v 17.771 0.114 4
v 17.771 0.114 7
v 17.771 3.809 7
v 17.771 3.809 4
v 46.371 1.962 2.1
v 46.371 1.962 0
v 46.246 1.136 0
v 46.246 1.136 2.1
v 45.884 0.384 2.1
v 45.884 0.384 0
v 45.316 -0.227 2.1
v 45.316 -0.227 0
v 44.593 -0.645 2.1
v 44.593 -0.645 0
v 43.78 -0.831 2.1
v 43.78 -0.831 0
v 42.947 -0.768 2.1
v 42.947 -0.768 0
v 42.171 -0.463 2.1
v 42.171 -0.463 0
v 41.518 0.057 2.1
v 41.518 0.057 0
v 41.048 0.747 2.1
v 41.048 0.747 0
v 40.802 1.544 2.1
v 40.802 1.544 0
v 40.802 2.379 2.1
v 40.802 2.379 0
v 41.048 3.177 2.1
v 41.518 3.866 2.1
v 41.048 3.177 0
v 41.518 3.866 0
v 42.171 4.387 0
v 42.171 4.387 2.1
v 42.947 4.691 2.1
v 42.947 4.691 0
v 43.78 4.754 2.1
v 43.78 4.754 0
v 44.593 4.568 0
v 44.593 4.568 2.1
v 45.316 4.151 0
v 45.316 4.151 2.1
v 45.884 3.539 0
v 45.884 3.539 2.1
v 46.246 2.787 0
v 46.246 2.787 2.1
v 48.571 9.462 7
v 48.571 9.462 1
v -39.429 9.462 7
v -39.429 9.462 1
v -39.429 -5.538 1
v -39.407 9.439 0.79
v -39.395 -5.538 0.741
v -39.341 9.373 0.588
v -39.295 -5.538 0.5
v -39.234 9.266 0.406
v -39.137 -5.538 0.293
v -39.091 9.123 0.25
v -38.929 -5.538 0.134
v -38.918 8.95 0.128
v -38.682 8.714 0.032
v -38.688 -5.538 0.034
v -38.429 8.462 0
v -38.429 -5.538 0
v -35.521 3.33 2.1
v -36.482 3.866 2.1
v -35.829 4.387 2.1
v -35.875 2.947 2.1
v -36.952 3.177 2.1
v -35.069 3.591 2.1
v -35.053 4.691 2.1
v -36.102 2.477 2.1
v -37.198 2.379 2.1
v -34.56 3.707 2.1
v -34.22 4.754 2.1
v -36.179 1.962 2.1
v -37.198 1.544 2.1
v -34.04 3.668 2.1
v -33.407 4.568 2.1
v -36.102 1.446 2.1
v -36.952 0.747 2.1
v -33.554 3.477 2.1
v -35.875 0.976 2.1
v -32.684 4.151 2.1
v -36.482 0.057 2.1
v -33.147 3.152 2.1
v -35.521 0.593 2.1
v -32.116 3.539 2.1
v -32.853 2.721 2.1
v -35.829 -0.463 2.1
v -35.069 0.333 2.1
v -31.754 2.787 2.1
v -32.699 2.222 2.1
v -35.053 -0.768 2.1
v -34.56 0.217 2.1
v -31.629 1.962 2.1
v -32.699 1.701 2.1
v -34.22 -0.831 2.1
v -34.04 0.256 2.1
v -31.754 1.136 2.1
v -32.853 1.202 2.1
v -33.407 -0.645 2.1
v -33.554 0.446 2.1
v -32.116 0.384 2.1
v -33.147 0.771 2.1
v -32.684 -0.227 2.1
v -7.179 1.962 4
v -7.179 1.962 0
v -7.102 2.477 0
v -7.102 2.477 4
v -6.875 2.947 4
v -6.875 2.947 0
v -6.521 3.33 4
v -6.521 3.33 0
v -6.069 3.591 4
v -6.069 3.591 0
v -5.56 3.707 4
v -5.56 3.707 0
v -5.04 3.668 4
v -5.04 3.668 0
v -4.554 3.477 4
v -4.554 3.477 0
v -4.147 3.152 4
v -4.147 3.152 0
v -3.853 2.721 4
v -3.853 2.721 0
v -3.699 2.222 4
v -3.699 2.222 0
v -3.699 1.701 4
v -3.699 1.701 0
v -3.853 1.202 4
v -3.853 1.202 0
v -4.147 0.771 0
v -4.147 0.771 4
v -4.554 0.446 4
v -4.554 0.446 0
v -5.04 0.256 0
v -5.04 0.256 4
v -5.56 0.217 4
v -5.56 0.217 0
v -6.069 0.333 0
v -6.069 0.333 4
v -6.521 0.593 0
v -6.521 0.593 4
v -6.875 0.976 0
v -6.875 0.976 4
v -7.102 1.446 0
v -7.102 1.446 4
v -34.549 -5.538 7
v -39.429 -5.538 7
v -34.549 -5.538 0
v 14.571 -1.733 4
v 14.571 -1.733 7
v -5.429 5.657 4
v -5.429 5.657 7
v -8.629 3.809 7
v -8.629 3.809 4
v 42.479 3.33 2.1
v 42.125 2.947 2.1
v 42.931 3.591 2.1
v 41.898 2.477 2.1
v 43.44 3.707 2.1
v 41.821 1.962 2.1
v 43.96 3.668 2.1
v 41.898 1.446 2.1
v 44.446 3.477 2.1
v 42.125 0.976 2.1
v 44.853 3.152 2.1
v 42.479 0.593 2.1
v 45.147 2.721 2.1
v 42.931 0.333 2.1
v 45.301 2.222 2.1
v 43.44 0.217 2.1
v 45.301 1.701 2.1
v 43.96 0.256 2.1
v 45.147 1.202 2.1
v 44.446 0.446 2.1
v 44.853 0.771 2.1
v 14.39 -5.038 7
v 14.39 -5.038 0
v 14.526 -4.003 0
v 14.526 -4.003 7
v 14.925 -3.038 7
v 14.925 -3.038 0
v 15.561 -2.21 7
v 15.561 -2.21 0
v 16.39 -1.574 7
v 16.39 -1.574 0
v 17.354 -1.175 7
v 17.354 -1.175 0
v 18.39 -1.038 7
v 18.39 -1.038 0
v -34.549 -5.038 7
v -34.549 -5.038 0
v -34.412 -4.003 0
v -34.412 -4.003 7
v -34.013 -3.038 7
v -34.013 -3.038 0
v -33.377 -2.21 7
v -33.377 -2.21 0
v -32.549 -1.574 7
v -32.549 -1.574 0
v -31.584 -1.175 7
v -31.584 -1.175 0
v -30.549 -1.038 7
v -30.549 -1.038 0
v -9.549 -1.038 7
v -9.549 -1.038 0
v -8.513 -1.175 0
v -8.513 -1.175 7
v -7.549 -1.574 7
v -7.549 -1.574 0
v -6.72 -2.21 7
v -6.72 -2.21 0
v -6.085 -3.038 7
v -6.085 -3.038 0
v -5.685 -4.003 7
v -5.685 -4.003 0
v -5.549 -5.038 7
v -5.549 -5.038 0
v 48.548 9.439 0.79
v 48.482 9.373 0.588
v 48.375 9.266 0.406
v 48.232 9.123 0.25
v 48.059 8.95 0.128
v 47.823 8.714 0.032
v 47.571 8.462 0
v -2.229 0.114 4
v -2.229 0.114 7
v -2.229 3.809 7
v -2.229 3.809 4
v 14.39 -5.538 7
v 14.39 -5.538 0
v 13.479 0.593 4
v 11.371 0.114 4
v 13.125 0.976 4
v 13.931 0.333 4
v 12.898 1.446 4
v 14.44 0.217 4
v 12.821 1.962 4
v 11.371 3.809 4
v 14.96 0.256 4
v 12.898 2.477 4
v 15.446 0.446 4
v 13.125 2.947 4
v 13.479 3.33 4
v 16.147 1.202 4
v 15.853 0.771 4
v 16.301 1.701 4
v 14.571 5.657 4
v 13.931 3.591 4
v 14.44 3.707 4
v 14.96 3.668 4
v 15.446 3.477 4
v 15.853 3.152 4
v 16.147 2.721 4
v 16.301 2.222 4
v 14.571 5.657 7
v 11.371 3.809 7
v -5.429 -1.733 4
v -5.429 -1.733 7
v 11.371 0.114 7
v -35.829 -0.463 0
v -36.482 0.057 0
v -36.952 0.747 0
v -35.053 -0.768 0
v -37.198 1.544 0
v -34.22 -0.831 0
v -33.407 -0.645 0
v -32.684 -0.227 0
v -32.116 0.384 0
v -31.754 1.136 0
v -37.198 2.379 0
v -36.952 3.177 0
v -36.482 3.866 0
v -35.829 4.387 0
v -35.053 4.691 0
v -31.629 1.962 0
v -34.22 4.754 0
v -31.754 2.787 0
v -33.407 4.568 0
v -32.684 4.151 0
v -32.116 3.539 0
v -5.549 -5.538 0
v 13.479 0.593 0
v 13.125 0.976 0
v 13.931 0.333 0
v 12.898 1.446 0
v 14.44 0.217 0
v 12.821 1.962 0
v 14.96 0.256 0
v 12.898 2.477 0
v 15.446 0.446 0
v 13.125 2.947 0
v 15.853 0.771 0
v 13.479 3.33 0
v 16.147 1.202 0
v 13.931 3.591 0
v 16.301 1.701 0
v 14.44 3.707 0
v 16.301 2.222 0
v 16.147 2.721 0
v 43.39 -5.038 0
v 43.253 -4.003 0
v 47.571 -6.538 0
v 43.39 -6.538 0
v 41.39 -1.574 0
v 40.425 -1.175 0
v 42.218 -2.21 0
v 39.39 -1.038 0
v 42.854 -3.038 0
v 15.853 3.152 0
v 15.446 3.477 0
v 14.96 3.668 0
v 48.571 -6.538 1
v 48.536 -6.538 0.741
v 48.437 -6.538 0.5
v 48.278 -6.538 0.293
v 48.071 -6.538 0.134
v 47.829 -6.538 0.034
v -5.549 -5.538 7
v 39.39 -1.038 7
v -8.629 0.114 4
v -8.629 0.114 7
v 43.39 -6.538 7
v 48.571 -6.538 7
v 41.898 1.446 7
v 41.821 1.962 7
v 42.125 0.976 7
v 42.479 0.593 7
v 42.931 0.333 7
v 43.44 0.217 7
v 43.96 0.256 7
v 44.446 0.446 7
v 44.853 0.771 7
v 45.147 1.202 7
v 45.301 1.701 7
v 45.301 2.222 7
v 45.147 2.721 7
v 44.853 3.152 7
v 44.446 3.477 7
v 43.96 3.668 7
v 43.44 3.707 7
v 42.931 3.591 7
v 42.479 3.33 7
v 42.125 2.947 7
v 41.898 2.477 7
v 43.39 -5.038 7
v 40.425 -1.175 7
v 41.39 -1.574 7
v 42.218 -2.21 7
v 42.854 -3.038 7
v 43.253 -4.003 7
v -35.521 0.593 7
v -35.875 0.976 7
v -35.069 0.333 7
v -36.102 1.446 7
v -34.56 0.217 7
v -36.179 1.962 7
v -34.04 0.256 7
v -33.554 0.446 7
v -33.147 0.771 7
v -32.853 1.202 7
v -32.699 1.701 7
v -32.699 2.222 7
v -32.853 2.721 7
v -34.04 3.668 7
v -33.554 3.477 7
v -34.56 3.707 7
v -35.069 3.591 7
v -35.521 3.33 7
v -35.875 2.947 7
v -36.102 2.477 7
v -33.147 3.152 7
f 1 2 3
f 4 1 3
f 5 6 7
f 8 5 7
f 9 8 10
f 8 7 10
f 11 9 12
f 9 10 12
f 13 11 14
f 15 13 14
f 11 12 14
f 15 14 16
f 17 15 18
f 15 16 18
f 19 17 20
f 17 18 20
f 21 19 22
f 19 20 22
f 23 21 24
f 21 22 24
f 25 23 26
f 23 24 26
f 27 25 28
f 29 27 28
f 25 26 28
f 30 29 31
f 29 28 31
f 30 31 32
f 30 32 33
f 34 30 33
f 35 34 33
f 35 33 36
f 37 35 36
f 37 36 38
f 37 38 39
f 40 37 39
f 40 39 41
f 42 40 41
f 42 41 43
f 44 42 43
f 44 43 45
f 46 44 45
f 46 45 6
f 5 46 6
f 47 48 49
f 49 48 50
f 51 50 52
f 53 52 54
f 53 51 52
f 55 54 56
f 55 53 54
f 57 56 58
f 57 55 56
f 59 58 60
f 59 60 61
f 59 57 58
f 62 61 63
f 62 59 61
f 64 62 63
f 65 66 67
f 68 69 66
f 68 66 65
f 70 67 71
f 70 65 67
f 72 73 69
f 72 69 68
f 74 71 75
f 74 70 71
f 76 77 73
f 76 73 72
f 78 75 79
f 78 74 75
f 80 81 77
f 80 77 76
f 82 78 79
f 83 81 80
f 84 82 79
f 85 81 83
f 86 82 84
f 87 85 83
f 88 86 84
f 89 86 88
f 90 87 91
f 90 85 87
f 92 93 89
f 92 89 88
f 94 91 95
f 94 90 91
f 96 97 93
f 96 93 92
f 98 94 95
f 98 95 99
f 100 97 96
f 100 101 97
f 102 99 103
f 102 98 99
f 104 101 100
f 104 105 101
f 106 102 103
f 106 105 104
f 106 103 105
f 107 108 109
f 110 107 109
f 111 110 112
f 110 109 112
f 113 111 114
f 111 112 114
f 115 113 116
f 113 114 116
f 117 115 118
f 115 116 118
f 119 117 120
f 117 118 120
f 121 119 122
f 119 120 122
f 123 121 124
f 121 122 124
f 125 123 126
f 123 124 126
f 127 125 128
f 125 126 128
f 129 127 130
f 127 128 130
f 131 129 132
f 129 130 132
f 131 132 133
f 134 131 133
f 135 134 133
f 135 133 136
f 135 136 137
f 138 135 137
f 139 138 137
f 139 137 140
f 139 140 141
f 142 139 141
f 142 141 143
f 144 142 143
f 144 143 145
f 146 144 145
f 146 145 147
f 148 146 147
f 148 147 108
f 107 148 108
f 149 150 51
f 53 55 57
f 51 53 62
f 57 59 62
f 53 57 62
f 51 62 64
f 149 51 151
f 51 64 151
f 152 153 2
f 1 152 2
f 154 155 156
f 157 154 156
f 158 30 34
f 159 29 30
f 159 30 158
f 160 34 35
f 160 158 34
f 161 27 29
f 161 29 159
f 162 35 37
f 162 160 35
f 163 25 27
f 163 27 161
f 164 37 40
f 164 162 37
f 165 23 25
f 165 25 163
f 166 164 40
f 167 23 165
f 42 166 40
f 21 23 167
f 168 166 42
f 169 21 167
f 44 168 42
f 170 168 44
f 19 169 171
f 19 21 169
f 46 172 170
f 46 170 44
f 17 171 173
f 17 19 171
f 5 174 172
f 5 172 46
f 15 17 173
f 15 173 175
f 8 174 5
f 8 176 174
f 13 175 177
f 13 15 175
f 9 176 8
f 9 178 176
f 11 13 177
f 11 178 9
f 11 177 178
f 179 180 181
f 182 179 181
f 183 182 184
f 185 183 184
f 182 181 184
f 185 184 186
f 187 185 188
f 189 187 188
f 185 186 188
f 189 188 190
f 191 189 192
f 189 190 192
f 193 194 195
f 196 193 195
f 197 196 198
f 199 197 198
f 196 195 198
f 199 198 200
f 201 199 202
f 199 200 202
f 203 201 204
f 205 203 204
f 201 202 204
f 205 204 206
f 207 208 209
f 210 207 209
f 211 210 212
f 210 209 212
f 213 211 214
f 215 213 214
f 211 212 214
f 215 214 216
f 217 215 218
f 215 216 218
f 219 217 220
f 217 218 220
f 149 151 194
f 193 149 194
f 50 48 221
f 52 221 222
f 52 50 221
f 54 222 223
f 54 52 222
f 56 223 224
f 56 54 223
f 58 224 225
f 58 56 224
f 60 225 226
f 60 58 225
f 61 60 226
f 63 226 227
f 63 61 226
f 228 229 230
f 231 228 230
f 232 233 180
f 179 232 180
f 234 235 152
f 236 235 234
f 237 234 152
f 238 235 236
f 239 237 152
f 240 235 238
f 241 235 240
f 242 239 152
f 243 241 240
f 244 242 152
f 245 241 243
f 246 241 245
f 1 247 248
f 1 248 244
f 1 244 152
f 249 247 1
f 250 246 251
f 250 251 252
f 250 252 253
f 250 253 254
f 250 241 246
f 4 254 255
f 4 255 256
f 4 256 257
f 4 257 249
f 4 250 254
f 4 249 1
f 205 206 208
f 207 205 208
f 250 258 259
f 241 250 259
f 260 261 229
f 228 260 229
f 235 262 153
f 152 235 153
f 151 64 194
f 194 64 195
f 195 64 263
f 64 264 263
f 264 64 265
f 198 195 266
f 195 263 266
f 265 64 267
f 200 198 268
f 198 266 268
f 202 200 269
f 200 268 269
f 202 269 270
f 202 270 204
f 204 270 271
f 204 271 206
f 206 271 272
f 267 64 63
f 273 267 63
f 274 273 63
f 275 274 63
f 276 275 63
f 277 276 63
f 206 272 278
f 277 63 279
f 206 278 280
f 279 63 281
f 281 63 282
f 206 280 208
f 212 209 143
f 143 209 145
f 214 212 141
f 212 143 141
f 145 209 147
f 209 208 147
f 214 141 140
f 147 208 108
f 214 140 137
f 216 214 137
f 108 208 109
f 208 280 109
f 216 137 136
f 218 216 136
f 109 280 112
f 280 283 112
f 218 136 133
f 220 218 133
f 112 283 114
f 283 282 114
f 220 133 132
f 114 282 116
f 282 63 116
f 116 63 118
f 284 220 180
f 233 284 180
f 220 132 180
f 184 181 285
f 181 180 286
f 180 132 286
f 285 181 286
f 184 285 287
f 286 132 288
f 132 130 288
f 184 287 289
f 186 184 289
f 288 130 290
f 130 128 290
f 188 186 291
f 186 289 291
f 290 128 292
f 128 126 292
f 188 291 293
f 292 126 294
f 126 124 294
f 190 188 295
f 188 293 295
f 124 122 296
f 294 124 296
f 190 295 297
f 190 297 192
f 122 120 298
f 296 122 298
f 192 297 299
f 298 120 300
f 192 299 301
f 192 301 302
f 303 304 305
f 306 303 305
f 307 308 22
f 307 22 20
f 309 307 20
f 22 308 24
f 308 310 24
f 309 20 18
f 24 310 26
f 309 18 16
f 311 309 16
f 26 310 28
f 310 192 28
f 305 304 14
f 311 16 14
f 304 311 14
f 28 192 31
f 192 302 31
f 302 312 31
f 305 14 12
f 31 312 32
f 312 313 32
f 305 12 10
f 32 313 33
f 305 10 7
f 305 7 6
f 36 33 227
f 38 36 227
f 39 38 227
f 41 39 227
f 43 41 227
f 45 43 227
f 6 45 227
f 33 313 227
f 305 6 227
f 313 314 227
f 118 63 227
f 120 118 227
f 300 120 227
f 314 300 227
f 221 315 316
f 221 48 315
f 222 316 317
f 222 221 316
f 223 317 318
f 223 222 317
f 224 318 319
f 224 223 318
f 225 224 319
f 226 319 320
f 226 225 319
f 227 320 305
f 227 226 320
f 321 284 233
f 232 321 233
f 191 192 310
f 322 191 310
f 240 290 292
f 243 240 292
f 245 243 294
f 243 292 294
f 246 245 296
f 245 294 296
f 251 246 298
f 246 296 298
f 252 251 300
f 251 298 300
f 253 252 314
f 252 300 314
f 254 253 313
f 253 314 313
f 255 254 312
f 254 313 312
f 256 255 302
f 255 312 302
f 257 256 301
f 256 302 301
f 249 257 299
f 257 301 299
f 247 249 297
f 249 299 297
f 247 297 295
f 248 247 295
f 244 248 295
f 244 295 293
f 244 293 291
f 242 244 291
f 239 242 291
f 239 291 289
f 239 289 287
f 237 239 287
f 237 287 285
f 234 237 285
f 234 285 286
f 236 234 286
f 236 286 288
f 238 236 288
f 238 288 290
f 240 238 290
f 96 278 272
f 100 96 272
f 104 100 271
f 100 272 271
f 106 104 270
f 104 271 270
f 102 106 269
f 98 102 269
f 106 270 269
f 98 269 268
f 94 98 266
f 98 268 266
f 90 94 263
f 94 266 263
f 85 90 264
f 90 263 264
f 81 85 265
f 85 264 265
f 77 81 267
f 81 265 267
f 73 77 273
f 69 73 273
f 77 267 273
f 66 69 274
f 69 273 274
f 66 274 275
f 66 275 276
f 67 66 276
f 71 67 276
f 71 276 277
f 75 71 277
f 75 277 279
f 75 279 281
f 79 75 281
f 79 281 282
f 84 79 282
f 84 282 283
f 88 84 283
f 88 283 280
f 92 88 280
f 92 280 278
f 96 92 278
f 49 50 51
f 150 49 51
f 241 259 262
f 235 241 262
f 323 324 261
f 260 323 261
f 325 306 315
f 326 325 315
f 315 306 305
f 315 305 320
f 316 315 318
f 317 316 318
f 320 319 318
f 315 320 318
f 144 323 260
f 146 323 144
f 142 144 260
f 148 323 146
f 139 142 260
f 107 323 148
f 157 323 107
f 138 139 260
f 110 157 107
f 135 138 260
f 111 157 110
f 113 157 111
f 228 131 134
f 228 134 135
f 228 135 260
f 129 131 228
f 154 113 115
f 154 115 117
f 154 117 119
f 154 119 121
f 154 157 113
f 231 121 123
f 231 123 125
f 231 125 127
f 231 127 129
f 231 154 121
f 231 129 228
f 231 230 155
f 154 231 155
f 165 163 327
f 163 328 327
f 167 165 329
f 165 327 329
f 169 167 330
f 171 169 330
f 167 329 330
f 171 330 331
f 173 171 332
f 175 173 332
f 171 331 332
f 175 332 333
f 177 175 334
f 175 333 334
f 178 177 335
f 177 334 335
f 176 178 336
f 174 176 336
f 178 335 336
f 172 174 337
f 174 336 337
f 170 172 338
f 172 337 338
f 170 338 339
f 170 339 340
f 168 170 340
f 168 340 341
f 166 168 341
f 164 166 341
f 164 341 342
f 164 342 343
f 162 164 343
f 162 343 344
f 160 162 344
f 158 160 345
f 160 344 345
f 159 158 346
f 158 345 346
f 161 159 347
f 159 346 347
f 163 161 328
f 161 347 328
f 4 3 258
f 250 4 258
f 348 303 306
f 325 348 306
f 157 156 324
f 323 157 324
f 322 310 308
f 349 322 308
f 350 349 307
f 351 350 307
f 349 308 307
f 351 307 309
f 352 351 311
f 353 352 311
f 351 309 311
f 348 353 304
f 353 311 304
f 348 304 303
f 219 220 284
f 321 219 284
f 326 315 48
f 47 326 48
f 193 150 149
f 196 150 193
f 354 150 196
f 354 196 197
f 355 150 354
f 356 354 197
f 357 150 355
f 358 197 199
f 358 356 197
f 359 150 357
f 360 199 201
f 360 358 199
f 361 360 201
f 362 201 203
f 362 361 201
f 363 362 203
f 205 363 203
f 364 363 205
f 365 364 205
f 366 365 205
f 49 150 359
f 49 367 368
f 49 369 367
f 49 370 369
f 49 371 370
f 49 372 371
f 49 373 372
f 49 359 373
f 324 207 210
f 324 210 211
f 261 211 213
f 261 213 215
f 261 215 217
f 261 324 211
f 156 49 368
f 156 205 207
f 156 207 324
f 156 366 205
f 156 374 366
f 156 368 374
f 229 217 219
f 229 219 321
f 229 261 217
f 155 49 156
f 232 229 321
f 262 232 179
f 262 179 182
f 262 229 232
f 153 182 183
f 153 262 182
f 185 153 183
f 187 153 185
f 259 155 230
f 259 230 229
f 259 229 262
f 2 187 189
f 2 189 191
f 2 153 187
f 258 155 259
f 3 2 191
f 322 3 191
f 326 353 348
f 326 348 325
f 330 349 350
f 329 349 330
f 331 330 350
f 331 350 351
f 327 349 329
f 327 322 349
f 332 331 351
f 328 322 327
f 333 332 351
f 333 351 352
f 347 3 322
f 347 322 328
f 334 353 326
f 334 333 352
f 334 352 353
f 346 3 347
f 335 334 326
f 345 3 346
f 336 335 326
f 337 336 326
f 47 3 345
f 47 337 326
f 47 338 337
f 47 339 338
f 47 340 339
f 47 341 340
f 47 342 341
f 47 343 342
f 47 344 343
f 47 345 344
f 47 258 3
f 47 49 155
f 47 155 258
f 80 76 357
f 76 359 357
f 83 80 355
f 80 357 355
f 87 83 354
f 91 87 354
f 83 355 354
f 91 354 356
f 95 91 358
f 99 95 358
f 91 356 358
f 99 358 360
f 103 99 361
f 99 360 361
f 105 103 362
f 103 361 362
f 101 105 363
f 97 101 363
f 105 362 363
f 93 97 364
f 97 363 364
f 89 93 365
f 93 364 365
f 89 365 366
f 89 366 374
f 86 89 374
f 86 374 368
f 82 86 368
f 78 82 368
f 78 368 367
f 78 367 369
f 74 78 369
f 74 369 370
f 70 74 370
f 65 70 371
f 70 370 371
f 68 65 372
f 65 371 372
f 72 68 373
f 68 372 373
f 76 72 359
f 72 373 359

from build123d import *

# Parameters (mm, degrees)
F1_DEPTH       = 7
F3_DEPTH       = 3
F4_D           = 3.5
F5_R           = 1
F7_D           = 3.5
F7_CBORE_D     = 5.6
F7_CBORE_DEPTH = 2.1


# Not quite as in the source:
# - a feature names something its author has since deleted; it is built from what else it names


with BuildPart() as f1:
    # F0 (on Top) → F1 (new body)
    with BuildSketch(Plane.XY):
        with BuildLine():
            Line((48.5705398023, 9.4616535902), (-39.4294601977, 9.4616535902))
            Line((-39.4294601977, 9.4616535902), (-39.4294601977, -5.5383464098))
            Line((-39.4294601977, -5.5383464098), (-34.5486067235, -5.5383464098))
            Line((-34.5486067235, -5.5383464098), (-34.5486067235, -5.0383464098))
            ThreePointArc((-34.5486067235, -5.0383464098), (-33.3770338483, -2.2099192851), (-30.5486067235, -1.0383464098))
            Line((-30.5486067235, -1.0383464098), (-9.5486067235, -1.0383464098))
            ThreePointArc((-9.5486067235, -1.0383464098), (-6.7201795988, -2.2099192851), (-5.5486067235, -5.0383464098))
            Line((-5.5486067235, -5.0383464098), (-5.5486067235, -5.5383464098))
            Line((-5.5486067235, -5.5383464098), (14.3895465881, -5.5383464098))
            Line((14.3895465881, -5.5383464098), (14.3895465881, -5.0383464098))
            ThreePointArc((14.3895465881, -5.0383464098), (15.5611194633, -2.2099192851), (18.3895465881, -1.0383464098))
            Line((18.3895465881, -1.0383464098), (39.3895465881, -1.0383464098))
            ThreePointArc((39.3895465881, -1.0383464098), (42.2179737128, -2.2099192851), (43.3895465881, -5.0383464098))
            Line((43.3895465881, -5.0383464098), (43.3895465881, -6.5383464098))
            Line((43.3895465881, -6.5383464098), (48.5705398023, -6.5383464098))
            Line((48.5705398023, -6.5383464098), (48.5705398023, 9.4616535902))
        make_face()
    extrude(amount=F1_DEPTH)

    # F2 (on face) → F3 (cut)
    with BuildSketch(Plane.XY.offset(7)):
        Polygon((17.7705398023, 0.1141327288), (17.7705398023, 3.8091744516), (14.5705398023, 5.656695313), (11.3705398023, 3.8091744516), (11.3705398023, 0.1141327288), (14.5705398023, -1.7333881326), align=None)
        Polygon((-8.6294601977, 3.8091744516), (-8.6294601977, 0.1141327288), (-5.4294601977, -1.7333881326), (-2.2294601977, 0.1141327288), (-2.2294601977, 3.8091744516), (-5.4294601977, 5.656695313), align=None)
    extrude(amount=-F3_DEPTH, mode=Mode.SUBTRACT)

    # F4 (through all)
    with Locations(Plane.XY.offset(7)):
        with Locations((-5.4294601977, 1.9616535902), (14.5705398023, 1.9616535902)):
            Hole(F4_D / 2)

    # F5
    f5_edges = [f1.edges().sort_by_distance(p)[0] for p in [
        (48.57054, 1.461654, 0),
        (4.57054, 9.461654, 0),
        (-39.42946, 1.961654, 0),
    ]]
    fillet(f5_edges, radius=F5_R)

    # F7 (through all)
    with Locations(Plane(origin=(0, 0, 0), x_dir=(1, 0, 0), z_dir=(0, 0, -1))):
        with Locations((-34.4294601977, -1.9616535902), (43.5705398023, -1.9616535902)):
            CounterBoreHole(F7_D / 2, F7_CBORE_D / 2, F7_CBORE_DEPTH)


solid = f1.part
